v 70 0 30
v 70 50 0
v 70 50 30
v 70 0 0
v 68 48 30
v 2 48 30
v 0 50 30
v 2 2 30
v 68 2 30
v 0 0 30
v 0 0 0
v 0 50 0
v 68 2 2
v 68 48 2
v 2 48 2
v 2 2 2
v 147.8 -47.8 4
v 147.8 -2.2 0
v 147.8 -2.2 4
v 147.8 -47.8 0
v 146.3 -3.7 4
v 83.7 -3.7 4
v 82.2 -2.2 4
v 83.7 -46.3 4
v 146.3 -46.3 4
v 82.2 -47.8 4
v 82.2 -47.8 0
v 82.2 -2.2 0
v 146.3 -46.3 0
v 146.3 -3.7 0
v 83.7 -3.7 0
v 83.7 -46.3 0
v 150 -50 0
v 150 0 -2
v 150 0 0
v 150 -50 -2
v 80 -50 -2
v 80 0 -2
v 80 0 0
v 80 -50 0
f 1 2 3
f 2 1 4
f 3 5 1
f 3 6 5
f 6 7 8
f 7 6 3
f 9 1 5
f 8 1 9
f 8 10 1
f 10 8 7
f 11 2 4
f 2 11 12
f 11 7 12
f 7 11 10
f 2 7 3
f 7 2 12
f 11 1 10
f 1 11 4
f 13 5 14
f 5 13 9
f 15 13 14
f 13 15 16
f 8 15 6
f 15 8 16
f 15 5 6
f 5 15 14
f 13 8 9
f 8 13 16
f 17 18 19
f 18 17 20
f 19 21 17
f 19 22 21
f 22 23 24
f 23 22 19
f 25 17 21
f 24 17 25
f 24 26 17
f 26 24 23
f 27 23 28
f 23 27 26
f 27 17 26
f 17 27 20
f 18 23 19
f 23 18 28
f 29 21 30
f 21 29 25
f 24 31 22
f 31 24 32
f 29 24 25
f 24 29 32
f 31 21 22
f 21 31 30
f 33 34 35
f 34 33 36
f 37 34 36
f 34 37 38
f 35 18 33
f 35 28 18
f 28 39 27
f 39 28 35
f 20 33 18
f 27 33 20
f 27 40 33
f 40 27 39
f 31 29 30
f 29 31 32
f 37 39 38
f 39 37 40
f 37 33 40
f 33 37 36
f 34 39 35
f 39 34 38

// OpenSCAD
// --- Parameters ---

// Box Dimensions
box_width = 70;          // X dimension of box
box_depth = 50;          // Y dimension of box
box_height = 30;         // Z dimension of box
box_wall_thick = 2;      // Thickness of walls
box_floor_thick = 2;     // Thickness of bottom floor

// Lid Dimensions
lid_plate_width = 70;    // X dimension of lid plate
lid_plate_depth = 50;    // Y dimension of lid plate
lid_plate_thick = 2;     // Z thickness of lid plate
lid_lip_thick = 1.5;     // Thickness of the retaining lip
lid_lip_height = 4;      // Height of the lip above the plate
lid_clearance = 0.2;     // Clearance per side (0.4mm total reduction)

// Layout
gap = 10;                // Gap between parts for printing
$fn = 64;                // Smoothness for curves

// --- Part 1: The Box ---
// Positioned at origin, resting on XY plane
module box() {
    difference() {
        // Outer shape
        cube([box_width, box_depth, box_height]);
        
        // Inner cavity
        translate([box_wall_thick, box_wall_thick, box_floor_thick]) {
            cube([
                box_width - (2 * box_wall_thick), 
                box_depth - (2 * box_wall_thick), 
                box_height // Extend to top to ensure open top
            ]);
        }
    }
}

// --- Part 2: The Lid ---
// Printed upside down (lip pointing down towards bed)
// Positioned on the +X side of the box
module lid() {
    // We model the lid such that the plate is at Z=0 and the lip is at Z < 0
    // However, to follow "printed upside down: a plate... with a lip on top",
    // we will model it as requested and the user can flip it, 
    // but for a standard "upside down" print where the plate is on the bed:
    
    union() {
        // The Plate (Bottom layer)
        cube([lid_plate_width, lid_plate_depth, lid_plate_thick]);
        
        // The Lip (The part that slides into the box)
        // To print "upside down" with the plate on the bed, the lip must be 
        // modeled extending downwards from the plate.
        translate([
            (lid_plate_width - (65.6)) / 2, 
            (lid_plate_depth - (45.6)) / 2, 
            -lid_lip_height
        ]) {
            difference() {
                // Outer boundary of lip
                cube([65.6, 45.6, lid_lip_height + 0.01]);
                
                // Inner cavity of lip (to allow sliding)
                // We subtract the lip thickness from the outer dimensions
                translate([lid_lip_thick, lid_lip_thick, -0.01]) {
                    cube([
                        65.6 - (2 * lid_lip_thick), 
                        45.6 - (2 * lid_lip_thick), 
                        lid_lip_height + 0.02
                    ]);
                }
            }
        }
    }
}

// --- Assembly / Layout ---

// Part 1: Box
translate([0, 0, 0]) {
    box();
}

// Part 2: Lid
// Placed on +X side with a gap. 
// Since the lid is "printed upside down", we rotate it 180 deg on X axis
// so the plate sits on the bed and the lip points down.
translate([box_width + gap, 0, 0]) {
    rotate([180, 0, 0]) {
        lid();
    }
}
